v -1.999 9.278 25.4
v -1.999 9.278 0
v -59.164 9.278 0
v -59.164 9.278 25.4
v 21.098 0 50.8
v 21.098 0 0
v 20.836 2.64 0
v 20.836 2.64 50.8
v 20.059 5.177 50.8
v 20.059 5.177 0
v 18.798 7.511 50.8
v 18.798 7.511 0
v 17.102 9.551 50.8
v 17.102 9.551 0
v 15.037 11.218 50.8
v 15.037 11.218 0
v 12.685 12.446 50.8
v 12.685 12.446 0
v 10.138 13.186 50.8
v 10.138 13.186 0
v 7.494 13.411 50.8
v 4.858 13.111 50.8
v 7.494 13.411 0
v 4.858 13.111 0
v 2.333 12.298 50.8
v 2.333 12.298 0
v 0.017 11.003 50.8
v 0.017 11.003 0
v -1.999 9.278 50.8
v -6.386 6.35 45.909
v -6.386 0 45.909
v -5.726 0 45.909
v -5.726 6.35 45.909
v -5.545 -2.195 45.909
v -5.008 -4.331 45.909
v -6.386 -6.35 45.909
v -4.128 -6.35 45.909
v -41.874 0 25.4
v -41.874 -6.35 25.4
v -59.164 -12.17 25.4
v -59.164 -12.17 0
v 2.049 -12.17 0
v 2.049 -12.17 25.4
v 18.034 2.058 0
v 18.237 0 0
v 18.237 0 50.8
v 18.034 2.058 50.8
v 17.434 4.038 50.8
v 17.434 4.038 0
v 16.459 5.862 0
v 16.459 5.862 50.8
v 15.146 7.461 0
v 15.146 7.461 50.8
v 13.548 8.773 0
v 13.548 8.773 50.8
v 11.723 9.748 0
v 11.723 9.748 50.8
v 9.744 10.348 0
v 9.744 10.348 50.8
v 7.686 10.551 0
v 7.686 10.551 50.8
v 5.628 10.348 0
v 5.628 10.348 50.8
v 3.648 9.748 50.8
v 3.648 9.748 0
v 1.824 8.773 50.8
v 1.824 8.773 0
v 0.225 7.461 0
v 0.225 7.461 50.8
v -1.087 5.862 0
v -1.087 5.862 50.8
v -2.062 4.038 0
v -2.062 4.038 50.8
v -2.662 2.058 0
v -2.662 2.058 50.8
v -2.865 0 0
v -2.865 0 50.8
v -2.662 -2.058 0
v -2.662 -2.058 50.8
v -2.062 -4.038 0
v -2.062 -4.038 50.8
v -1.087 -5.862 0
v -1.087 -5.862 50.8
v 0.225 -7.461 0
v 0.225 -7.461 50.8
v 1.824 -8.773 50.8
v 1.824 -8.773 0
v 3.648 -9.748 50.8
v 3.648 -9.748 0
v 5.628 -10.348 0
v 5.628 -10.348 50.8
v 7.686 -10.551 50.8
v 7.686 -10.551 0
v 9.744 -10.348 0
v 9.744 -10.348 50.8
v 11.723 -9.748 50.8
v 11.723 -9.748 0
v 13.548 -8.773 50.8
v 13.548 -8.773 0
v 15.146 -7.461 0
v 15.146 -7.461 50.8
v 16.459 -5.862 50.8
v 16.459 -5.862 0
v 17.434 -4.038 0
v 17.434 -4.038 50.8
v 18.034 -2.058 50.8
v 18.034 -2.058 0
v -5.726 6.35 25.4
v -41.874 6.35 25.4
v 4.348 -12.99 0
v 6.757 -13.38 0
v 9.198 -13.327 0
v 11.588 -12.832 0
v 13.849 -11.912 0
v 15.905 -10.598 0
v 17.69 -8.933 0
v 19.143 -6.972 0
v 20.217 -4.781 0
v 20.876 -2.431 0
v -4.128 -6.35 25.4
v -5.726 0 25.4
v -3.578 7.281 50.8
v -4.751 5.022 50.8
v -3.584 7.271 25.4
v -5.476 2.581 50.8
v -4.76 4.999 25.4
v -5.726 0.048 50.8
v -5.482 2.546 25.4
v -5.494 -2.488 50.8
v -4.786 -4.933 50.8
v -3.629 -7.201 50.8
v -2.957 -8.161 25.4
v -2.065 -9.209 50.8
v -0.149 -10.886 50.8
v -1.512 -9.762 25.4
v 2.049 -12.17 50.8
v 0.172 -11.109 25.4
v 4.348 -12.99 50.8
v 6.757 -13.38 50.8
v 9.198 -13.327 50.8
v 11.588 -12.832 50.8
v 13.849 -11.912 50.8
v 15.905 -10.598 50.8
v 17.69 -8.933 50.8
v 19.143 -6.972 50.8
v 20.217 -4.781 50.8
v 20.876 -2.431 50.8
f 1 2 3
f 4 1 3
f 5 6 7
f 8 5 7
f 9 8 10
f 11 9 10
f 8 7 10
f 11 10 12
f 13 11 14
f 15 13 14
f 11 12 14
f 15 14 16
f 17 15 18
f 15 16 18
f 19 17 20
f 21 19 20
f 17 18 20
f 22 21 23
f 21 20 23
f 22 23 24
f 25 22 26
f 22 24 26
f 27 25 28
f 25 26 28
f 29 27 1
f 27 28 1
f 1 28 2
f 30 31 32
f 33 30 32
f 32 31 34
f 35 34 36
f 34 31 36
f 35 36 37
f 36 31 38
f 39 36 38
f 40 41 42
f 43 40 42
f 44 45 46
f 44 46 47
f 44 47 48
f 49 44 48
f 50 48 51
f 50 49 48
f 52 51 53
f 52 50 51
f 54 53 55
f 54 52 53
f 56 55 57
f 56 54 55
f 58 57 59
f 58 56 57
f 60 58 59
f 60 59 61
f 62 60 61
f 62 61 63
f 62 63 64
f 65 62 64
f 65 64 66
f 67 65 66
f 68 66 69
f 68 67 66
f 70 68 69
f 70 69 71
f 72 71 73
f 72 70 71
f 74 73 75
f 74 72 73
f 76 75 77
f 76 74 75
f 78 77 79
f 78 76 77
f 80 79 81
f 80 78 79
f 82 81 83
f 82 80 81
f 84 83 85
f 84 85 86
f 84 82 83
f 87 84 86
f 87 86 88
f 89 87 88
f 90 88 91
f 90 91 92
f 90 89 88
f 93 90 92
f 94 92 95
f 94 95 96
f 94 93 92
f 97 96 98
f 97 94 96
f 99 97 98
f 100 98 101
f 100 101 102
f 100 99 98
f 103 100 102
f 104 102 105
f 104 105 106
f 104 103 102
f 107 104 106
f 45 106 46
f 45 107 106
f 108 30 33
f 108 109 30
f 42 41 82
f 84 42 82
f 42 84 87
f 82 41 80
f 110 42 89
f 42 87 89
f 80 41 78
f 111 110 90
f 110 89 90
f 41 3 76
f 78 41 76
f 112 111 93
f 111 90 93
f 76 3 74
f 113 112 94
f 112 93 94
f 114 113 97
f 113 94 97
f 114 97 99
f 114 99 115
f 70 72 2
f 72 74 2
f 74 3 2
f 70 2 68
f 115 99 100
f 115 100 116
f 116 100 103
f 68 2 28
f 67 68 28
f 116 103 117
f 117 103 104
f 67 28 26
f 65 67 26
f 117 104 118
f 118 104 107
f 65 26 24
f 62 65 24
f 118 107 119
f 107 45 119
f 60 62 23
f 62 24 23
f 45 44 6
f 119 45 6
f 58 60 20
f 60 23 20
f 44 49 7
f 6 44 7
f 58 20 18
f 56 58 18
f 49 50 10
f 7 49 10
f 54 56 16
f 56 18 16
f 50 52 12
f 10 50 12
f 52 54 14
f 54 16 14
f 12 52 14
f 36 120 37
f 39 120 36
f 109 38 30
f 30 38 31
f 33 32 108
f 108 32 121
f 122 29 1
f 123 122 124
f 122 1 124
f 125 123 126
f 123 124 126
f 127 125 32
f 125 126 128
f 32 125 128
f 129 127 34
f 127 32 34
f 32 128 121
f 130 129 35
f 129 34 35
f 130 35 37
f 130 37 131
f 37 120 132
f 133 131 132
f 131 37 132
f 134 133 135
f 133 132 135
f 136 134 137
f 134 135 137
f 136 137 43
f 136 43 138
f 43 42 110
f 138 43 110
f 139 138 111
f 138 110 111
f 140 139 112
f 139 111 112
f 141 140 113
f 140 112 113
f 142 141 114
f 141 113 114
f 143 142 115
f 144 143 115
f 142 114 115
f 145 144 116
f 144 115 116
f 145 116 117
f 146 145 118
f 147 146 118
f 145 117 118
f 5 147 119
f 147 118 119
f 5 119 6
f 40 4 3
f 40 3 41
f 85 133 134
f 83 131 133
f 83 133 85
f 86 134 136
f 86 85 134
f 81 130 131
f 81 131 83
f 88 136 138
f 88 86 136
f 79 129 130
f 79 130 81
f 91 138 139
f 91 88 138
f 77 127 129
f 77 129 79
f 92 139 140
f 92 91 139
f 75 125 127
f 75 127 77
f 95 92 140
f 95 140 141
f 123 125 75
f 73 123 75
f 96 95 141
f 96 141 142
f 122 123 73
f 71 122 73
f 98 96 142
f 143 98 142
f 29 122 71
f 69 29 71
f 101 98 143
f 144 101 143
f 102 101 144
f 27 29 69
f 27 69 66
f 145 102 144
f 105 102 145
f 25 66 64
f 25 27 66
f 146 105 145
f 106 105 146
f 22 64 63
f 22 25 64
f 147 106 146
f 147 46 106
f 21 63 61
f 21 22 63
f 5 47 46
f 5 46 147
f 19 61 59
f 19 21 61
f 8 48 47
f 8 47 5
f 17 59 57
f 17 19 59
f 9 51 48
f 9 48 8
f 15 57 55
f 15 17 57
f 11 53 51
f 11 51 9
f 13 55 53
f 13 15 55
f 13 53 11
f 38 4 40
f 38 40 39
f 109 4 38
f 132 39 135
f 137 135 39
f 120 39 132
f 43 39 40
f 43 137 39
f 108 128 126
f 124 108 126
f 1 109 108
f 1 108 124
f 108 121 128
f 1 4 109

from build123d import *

# Parameters (mm, degrees)
F1_DEPTH  = 25.4
F0_R      = 10.550798
F2_DEPTH  = 50.8
F4_DEPTH  = 6.35
F4_FACE_W = 6.35
F4_FACE_H = 20.509356
F5_DEPTH  = 2.54
F6_DEPTH  = 6.35


with BuildPart() as f1:
    # F0 (on Top) → F1 (new body)
    with BuildSketch(Plane.XY):
        with BuildLine():
            Line((-4.458389, 9.278268), (-59.164021, 9.278268))
            Line((-59.164021, 9.278268), (-59.164021, -12.170196))
            Line((-59.164021, -12.170196), (-4.458389, -12.170196))
            Line((-4.458389, -12.170196), (2.049189, -12.170196))
            ThreePointArc((2.049189, -12.170196), (-5.493572, -2.487583), (-1.999147, 9.278268))
            Line((-1.999147, 9.278268), (-4.458389, 9.278268))
        make_face()
    extrude(amount=F1_DEPTH)

    # F0 (on Top) → F2 (join)
    with BuildSketch(Plane.XY):
        with BuildLine():
            ThreePointArc((21.098027, 0), (12.685318, 12.445538), (-1.999147, 9.278268))
            ThreePointArc((-1.999147, 9.278268), (-5.493572, -2.487583), (2.049189, -12.170196))
            ThreePointArc((2.049189, -12.170196), (14.906878, -11.302344), (21.098027, 0))
        make_face()
        with Locations((7.685874, 0)):
            Circle(F0_R, mode=Mode.SUBTRACT)
    extrude(amount=F2_DEPTH)

    # F3 (on Front) → F4 (join)
    with BuildSketch(Plane.XZ):
        Polygon((-6.386341, 45.909356), (-43.499414, 24.460889), (-43.499414, 23.014925), (-6.386341, 23.014925), align=None)
    extrude(amount=F4_DEPTH)

    # F4_face (on face) → F5 (join)
    with BuildSketch(Plane(origin=(-6.386341, -3.175, 35.654678), x_dir=(0, 1, 0), z_dir=(1, 0, 0))):
        Rectangle(F4_FACE_W, F4_FACE_H)
    extrude(amount=F5_DEPTH)

    # F5_face (on face) → F6 (join)
    with BuildSketch(Plane(origin=(-17.779611, 0, 32.359046), x_dir=(1, 0, 0), z_dir=(0, 1, 0))):
        Polygon((11.39327, -13.55031), (12.053331, -13.55031), (12.053331, 6.959046), (-24.094825, 6.959046), align=None)
    extrude(amount=F6_DEPTH)


solid = f1.part
